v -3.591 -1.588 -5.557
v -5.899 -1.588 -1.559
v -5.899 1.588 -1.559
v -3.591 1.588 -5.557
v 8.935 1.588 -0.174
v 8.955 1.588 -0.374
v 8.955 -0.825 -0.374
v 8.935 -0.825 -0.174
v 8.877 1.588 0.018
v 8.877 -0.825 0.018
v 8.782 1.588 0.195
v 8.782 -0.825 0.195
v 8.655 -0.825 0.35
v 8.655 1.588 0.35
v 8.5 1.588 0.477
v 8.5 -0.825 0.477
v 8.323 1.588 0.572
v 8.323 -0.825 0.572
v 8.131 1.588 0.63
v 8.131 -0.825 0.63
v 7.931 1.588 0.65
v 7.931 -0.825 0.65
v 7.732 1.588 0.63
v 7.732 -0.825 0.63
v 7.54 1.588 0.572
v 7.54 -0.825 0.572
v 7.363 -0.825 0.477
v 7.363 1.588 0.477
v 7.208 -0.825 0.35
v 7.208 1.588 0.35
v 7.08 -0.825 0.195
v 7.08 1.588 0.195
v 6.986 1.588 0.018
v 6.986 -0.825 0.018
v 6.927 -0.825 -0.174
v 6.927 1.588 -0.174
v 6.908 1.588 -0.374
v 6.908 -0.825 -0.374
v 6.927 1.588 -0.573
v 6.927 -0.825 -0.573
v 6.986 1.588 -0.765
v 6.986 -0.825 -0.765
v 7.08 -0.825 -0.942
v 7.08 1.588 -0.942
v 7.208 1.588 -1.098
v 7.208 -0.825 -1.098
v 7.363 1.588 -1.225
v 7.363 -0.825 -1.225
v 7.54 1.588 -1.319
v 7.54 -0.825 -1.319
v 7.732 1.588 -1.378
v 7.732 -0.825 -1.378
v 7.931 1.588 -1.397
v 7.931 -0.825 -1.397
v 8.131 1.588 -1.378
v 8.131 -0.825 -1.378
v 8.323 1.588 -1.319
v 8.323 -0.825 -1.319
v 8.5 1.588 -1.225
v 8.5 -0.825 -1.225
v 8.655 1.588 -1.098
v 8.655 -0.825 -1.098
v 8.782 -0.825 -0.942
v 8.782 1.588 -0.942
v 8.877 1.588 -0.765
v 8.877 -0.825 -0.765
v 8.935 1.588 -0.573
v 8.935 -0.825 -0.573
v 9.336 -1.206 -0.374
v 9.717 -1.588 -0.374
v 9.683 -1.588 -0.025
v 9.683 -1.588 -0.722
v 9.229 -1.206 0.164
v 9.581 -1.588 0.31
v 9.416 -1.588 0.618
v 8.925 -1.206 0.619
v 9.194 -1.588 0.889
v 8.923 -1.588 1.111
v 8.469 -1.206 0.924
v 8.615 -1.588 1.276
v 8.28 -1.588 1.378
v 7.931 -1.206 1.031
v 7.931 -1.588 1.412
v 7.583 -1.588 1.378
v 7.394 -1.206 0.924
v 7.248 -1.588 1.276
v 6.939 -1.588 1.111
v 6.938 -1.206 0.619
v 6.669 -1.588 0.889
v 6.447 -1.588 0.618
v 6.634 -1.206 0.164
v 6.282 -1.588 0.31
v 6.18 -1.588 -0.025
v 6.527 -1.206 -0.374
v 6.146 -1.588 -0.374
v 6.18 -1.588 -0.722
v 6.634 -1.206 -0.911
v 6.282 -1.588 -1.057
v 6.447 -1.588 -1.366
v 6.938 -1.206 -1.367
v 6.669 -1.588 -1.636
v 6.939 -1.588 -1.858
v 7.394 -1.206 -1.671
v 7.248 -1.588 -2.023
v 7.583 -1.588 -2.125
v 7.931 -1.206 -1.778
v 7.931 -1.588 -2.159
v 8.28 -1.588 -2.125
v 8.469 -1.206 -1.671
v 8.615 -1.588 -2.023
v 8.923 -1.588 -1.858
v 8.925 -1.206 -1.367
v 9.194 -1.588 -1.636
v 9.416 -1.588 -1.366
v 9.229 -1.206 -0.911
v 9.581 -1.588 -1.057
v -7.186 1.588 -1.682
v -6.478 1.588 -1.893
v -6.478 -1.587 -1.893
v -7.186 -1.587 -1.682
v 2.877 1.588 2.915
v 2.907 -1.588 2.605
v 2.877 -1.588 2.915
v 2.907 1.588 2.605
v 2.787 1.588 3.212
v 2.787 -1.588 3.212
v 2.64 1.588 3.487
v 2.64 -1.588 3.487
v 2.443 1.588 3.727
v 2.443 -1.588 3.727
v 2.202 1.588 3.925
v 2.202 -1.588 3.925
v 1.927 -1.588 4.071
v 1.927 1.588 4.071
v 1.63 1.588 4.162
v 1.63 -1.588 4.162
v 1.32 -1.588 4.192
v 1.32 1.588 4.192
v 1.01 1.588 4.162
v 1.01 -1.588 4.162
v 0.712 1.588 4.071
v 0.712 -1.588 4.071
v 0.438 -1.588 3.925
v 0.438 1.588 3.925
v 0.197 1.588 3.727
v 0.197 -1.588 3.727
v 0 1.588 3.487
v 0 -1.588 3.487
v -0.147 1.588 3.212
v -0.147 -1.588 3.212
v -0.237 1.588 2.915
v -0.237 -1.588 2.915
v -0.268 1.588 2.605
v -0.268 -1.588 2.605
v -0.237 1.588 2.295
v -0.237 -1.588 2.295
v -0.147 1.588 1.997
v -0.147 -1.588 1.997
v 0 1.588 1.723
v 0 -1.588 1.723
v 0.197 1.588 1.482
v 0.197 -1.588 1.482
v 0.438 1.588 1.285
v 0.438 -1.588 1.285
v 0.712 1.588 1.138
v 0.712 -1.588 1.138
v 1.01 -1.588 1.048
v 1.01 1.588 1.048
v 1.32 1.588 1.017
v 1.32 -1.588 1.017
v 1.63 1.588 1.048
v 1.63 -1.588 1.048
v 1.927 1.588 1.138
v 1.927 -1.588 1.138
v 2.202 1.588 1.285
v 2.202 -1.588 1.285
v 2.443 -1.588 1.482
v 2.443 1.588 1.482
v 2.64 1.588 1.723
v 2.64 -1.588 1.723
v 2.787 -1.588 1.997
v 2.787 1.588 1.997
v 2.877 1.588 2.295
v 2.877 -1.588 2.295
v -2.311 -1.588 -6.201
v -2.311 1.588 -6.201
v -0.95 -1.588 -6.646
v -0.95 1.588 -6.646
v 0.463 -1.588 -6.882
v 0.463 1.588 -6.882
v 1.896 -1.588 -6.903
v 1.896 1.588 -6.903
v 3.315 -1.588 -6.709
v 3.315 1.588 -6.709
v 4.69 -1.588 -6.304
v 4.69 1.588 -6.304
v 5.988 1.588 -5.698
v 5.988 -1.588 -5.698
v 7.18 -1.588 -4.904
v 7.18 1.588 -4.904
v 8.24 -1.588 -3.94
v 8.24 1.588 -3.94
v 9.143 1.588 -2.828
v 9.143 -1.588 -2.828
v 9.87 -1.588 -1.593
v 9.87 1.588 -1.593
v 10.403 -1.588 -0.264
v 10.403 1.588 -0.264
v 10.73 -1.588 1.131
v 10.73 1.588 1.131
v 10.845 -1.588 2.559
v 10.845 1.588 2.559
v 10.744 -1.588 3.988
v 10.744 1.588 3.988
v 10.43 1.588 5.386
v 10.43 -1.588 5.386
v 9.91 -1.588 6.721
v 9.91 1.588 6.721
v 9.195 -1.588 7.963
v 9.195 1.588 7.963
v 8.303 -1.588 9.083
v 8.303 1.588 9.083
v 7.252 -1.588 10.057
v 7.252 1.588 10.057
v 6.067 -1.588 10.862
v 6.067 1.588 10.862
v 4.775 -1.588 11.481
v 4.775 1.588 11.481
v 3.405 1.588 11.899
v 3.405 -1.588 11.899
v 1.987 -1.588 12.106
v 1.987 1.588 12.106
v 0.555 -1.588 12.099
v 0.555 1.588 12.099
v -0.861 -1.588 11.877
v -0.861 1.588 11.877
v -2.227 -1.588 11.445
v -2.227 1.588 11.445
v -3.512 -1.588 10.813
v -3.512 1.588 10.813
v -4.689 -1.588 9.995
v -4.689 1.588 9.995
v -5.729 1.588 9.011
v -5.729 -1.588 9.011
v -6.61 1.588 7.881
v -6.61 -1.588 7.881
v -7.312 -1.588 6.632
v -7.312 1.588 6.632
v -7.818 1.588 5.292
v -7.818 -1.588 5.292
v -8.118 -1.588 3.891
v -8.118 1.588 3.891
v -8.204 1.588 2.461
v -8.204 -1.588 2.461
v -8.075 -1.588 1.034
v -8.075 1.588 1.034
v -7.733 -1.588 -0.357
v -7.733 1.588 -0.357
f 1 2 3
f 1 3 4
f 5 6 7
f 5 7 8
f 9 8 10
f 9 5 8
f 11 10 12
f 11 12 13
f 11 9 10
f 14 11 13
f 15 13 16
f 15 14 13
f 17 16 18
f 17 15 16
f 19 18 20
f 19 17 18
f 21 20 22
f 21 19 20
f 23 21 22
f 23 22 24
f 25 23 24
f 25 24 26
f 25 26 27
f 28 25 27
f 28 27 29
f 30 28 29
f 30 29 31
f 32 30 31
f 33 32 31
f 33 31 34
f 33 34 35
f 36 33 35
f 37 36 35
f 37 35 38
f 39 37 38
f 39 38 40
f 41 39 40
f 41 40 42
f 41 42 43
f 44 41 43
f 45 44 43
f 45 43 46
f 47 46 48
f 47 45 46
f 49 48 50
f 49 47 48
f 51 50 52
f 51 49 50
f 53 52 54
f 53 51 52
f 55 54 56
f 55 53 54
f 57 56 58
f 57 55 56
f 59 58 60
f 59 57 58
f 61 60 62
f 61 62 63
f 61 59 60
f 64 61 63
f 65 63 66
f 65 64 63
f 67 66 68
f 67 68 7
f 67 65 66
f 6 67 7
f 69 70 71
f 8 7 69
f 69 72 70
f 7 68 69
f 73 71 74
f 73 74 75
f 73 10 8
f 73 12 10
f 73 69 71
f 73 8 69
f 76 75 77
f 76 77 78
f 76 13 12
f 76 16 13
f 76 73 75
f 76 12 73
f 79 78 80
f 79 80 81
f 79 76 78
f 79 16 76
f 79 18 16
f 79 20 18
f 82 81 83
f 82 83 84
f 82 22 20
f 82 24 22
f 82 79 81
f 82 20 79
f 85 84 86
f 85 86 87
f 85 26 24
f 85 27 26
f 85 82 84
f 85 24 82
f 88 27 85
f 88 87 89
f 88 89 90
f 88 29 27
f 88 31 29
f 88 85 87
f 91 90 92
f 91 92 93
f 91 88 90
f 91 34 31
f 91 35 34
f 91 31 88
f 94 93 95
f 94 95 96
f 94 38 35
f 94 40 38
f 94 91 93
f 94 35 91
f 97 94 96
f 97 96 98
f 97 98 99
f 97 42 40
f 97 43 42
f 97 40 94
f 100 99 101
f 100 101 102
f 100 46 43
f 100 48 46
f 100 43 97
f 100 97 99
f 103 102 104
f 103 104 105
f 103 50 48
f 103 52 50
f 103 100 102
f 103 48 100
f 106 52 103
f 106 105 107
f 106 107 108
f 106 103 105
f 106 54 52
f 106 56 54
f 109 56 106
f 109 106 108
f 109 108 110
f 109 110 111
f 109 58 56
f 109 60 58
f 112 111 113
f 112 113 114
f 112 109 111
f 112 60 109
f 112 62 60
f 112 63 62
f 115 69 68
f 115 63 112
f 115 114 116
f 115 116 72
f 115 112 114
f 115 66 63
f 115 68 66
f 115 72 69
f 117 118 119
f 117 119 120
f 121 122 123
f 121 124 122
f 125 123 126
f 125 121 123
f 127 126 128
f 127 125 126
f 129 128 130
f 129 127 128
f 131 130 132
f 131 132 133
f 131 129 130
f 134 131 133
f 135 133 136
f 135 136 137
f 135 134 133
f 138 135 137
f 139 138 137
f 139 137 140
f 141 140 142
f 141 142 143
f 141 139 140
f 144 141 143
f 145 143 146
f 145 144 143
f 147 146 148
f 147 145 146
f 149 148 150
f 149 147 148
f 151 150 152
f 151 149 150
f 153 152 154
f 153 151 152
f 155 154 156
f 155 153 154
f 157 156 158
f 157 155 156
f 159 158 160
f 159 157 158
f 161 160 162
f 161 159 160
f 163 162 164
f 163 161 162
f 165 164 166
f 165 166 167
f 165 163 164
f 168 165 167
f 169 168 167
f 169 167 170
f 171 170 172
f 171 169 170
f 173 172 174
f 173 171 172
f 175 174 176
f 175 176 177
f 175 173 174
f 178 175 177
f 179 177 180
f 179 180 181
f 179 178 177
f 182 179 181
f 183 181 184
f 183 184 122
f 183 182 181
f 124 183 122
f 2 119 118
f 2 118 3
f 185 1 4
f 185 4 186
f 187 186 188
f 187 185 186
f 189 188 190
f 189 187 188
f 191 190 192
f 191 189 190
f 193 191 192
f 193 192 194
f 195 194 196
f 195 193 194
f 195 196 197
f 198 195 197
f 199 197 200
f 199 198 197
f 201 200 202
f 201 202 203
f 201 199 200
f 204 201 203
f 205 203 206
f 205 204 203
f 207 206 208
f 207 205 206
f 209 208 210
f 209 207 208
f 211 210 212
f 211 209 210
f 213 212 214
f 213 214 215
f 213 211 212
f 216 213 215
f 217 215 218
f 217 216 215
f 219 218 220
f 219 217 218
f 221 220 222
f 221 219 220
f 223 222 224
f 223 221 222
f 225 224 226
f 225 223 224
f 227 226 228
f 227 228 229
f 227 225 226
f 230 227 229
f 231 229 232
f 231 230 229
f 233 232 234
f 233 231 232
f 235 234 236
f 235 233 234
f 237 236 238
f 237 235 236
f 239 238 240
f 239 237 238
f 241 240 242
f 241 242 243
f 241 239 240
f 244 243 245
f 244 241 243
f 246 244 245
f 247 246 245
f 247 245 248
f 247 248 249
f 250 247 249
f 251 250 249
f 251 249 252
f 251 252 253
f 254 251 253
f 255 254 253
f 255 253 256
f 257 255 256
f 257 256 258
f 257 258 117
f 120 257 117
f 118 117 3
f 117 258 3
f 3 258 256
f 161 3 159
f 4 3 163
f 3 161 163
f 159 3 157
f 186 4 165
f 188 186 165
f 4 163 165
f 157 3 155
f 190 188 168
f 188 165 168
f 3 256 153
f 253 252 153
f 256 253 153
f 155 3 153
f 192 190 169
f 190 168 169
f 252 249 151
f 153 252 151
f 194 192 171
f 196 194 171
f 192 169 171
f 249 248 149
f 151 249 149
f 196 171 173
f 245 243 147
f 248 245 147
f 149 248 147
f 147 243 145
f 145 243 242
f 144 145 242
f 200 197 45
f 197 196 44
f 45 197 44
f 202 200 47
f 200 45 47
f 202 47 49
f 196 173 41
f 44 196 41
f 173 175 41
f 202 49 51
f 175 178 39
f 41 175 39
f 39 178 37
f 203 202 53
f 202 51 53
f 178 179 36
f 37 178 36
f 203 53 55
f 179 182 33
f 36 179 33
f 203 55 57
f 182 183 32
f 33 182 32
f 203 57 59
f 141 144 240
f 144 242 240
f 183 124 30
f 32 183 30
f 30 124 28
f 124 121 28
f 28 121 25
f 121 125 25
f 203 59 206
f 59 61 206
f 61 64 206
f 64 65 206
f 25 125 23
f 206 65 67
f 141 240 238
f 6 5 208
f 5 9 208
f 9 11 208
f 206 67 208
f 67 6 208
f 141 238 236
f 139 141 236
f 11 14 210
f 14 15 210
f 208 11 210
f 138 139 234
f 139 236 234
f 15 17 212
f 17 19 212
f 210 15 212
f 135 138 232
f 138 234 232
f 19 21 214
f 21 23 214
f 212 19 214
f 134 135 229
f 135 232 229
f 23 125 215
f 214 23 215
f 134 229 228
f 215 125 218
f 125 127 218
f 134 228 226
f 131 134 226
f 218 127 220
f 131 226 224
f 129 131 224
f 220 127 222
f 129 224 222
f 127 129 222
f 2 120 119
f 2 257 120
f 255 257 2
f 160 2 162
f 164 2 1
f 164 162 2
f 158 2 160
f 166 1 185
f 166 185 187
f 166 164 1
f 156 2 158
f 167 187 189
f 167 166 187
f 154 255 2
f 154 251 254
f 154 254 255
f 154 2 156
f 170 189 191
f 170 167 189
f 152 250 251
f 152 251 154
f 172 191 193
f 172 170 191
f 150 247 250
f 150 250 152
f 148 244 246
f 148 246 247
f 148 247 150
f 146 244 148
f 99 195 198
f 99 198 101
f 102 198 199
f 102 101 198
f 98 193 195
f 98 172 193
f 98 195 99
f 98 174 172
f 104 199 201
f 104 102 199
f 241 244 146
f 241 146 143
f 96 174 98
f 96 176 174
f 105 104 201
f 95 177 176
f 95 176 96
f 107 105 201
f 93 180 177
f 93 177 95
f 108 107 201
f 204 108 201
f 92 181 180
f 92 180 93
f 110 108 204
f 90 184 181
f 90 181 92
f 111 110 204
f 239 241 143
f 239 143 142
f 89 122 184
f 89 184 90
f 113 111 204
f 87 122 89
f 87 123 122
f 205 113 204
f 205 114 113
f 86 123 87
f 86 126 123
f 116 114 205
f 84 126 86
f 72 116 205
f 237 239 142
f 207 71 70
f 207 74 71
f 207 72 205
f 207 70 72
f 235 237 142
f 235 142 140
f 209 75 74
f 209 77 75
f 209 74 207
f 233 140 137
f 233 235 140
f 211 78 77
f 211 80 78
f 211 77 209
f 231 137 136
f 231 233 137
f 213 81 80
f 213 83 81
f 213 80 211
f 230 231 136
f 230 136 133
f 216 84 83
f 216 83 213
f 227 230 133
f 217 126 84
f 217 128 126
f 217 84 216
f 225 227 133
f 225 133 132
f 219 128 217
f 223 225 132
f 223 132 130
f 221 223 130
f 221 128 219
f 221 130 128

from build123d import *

# Parameters (mm, degrees)
F0_R        = 1.02362
F0_R_2      = 1.5875
F1_DEPTH    = 1.5875
F2_SIZE2    = 0.762
F2_SIZE     = 0.762
F3_T1_DEPTH = 5.9330773534


# Not quite as in the source:
# - a fillet or chamfer that OpenCascade refuses, or shapes differently, is made with other operations: its cross-section is extruded or revolved along the edge and cut away or added


with BuildPart() as f1:
    # F0 (on Front) → F1 (new body, symmetric)
    with BuildSketch(Plane.XZ):
        with BuildLine():
            Line((-6.9308998718, -2.1542398912), (-5.8992384492, -1.5586098912))
            Line((-5.8992384492, -1.5586098912), (-3.5910470257, -5.5565147104))
            ThreePointArc((-3.5910470257, -5.5565147104), (8.1172314393, 9.2773759439), (-6.9308998718, -2.1542398912))
        make_face()
        with Locations((7.9313591488, -0.3737701657)):
            Circle(F0_R, mode=Mode.SUBTRACT)
        with Locations((1.3199729119, 2.6048275917)):
            Circle(F0_R_2, mode=Mode.SUBTRACT)
    extrude(amount=F1_DEPTH, both=True)

    # F2
    f2_edges = [f1.edges().sort_by_distance(p)[0] for p in [
        (6.907739, -1.5875, -0.37377),
    ]]
    chamfer(f2_edges, length=F2_SIZE, length2=F2_SIZE2)

    # F3: chamfer of 0.508 on 1 edges, made by hand

    # F3_s2 → F3_t1 (cut)
    with BuildSketch(Plane.XZ.offset(-2.9665386767)):
        with BuildLine():
            Line((-6.4783627065, -1.892967437), (-7.1860154174, -1.6816380318))
            ThreePointArc((-7.1860154174, -1.6816380318), (-7.0651975677, -1.9134177566), (-6.9308998718, -2.1542398912))
            Line((-6.9308998718, -2.1542398912), (-6.4783627065, -1.892967437))
        make_face()
    extrude(amount=F3_T1_DEPTH, mode=Mode.SUBTRACT)


solid = f1.part
